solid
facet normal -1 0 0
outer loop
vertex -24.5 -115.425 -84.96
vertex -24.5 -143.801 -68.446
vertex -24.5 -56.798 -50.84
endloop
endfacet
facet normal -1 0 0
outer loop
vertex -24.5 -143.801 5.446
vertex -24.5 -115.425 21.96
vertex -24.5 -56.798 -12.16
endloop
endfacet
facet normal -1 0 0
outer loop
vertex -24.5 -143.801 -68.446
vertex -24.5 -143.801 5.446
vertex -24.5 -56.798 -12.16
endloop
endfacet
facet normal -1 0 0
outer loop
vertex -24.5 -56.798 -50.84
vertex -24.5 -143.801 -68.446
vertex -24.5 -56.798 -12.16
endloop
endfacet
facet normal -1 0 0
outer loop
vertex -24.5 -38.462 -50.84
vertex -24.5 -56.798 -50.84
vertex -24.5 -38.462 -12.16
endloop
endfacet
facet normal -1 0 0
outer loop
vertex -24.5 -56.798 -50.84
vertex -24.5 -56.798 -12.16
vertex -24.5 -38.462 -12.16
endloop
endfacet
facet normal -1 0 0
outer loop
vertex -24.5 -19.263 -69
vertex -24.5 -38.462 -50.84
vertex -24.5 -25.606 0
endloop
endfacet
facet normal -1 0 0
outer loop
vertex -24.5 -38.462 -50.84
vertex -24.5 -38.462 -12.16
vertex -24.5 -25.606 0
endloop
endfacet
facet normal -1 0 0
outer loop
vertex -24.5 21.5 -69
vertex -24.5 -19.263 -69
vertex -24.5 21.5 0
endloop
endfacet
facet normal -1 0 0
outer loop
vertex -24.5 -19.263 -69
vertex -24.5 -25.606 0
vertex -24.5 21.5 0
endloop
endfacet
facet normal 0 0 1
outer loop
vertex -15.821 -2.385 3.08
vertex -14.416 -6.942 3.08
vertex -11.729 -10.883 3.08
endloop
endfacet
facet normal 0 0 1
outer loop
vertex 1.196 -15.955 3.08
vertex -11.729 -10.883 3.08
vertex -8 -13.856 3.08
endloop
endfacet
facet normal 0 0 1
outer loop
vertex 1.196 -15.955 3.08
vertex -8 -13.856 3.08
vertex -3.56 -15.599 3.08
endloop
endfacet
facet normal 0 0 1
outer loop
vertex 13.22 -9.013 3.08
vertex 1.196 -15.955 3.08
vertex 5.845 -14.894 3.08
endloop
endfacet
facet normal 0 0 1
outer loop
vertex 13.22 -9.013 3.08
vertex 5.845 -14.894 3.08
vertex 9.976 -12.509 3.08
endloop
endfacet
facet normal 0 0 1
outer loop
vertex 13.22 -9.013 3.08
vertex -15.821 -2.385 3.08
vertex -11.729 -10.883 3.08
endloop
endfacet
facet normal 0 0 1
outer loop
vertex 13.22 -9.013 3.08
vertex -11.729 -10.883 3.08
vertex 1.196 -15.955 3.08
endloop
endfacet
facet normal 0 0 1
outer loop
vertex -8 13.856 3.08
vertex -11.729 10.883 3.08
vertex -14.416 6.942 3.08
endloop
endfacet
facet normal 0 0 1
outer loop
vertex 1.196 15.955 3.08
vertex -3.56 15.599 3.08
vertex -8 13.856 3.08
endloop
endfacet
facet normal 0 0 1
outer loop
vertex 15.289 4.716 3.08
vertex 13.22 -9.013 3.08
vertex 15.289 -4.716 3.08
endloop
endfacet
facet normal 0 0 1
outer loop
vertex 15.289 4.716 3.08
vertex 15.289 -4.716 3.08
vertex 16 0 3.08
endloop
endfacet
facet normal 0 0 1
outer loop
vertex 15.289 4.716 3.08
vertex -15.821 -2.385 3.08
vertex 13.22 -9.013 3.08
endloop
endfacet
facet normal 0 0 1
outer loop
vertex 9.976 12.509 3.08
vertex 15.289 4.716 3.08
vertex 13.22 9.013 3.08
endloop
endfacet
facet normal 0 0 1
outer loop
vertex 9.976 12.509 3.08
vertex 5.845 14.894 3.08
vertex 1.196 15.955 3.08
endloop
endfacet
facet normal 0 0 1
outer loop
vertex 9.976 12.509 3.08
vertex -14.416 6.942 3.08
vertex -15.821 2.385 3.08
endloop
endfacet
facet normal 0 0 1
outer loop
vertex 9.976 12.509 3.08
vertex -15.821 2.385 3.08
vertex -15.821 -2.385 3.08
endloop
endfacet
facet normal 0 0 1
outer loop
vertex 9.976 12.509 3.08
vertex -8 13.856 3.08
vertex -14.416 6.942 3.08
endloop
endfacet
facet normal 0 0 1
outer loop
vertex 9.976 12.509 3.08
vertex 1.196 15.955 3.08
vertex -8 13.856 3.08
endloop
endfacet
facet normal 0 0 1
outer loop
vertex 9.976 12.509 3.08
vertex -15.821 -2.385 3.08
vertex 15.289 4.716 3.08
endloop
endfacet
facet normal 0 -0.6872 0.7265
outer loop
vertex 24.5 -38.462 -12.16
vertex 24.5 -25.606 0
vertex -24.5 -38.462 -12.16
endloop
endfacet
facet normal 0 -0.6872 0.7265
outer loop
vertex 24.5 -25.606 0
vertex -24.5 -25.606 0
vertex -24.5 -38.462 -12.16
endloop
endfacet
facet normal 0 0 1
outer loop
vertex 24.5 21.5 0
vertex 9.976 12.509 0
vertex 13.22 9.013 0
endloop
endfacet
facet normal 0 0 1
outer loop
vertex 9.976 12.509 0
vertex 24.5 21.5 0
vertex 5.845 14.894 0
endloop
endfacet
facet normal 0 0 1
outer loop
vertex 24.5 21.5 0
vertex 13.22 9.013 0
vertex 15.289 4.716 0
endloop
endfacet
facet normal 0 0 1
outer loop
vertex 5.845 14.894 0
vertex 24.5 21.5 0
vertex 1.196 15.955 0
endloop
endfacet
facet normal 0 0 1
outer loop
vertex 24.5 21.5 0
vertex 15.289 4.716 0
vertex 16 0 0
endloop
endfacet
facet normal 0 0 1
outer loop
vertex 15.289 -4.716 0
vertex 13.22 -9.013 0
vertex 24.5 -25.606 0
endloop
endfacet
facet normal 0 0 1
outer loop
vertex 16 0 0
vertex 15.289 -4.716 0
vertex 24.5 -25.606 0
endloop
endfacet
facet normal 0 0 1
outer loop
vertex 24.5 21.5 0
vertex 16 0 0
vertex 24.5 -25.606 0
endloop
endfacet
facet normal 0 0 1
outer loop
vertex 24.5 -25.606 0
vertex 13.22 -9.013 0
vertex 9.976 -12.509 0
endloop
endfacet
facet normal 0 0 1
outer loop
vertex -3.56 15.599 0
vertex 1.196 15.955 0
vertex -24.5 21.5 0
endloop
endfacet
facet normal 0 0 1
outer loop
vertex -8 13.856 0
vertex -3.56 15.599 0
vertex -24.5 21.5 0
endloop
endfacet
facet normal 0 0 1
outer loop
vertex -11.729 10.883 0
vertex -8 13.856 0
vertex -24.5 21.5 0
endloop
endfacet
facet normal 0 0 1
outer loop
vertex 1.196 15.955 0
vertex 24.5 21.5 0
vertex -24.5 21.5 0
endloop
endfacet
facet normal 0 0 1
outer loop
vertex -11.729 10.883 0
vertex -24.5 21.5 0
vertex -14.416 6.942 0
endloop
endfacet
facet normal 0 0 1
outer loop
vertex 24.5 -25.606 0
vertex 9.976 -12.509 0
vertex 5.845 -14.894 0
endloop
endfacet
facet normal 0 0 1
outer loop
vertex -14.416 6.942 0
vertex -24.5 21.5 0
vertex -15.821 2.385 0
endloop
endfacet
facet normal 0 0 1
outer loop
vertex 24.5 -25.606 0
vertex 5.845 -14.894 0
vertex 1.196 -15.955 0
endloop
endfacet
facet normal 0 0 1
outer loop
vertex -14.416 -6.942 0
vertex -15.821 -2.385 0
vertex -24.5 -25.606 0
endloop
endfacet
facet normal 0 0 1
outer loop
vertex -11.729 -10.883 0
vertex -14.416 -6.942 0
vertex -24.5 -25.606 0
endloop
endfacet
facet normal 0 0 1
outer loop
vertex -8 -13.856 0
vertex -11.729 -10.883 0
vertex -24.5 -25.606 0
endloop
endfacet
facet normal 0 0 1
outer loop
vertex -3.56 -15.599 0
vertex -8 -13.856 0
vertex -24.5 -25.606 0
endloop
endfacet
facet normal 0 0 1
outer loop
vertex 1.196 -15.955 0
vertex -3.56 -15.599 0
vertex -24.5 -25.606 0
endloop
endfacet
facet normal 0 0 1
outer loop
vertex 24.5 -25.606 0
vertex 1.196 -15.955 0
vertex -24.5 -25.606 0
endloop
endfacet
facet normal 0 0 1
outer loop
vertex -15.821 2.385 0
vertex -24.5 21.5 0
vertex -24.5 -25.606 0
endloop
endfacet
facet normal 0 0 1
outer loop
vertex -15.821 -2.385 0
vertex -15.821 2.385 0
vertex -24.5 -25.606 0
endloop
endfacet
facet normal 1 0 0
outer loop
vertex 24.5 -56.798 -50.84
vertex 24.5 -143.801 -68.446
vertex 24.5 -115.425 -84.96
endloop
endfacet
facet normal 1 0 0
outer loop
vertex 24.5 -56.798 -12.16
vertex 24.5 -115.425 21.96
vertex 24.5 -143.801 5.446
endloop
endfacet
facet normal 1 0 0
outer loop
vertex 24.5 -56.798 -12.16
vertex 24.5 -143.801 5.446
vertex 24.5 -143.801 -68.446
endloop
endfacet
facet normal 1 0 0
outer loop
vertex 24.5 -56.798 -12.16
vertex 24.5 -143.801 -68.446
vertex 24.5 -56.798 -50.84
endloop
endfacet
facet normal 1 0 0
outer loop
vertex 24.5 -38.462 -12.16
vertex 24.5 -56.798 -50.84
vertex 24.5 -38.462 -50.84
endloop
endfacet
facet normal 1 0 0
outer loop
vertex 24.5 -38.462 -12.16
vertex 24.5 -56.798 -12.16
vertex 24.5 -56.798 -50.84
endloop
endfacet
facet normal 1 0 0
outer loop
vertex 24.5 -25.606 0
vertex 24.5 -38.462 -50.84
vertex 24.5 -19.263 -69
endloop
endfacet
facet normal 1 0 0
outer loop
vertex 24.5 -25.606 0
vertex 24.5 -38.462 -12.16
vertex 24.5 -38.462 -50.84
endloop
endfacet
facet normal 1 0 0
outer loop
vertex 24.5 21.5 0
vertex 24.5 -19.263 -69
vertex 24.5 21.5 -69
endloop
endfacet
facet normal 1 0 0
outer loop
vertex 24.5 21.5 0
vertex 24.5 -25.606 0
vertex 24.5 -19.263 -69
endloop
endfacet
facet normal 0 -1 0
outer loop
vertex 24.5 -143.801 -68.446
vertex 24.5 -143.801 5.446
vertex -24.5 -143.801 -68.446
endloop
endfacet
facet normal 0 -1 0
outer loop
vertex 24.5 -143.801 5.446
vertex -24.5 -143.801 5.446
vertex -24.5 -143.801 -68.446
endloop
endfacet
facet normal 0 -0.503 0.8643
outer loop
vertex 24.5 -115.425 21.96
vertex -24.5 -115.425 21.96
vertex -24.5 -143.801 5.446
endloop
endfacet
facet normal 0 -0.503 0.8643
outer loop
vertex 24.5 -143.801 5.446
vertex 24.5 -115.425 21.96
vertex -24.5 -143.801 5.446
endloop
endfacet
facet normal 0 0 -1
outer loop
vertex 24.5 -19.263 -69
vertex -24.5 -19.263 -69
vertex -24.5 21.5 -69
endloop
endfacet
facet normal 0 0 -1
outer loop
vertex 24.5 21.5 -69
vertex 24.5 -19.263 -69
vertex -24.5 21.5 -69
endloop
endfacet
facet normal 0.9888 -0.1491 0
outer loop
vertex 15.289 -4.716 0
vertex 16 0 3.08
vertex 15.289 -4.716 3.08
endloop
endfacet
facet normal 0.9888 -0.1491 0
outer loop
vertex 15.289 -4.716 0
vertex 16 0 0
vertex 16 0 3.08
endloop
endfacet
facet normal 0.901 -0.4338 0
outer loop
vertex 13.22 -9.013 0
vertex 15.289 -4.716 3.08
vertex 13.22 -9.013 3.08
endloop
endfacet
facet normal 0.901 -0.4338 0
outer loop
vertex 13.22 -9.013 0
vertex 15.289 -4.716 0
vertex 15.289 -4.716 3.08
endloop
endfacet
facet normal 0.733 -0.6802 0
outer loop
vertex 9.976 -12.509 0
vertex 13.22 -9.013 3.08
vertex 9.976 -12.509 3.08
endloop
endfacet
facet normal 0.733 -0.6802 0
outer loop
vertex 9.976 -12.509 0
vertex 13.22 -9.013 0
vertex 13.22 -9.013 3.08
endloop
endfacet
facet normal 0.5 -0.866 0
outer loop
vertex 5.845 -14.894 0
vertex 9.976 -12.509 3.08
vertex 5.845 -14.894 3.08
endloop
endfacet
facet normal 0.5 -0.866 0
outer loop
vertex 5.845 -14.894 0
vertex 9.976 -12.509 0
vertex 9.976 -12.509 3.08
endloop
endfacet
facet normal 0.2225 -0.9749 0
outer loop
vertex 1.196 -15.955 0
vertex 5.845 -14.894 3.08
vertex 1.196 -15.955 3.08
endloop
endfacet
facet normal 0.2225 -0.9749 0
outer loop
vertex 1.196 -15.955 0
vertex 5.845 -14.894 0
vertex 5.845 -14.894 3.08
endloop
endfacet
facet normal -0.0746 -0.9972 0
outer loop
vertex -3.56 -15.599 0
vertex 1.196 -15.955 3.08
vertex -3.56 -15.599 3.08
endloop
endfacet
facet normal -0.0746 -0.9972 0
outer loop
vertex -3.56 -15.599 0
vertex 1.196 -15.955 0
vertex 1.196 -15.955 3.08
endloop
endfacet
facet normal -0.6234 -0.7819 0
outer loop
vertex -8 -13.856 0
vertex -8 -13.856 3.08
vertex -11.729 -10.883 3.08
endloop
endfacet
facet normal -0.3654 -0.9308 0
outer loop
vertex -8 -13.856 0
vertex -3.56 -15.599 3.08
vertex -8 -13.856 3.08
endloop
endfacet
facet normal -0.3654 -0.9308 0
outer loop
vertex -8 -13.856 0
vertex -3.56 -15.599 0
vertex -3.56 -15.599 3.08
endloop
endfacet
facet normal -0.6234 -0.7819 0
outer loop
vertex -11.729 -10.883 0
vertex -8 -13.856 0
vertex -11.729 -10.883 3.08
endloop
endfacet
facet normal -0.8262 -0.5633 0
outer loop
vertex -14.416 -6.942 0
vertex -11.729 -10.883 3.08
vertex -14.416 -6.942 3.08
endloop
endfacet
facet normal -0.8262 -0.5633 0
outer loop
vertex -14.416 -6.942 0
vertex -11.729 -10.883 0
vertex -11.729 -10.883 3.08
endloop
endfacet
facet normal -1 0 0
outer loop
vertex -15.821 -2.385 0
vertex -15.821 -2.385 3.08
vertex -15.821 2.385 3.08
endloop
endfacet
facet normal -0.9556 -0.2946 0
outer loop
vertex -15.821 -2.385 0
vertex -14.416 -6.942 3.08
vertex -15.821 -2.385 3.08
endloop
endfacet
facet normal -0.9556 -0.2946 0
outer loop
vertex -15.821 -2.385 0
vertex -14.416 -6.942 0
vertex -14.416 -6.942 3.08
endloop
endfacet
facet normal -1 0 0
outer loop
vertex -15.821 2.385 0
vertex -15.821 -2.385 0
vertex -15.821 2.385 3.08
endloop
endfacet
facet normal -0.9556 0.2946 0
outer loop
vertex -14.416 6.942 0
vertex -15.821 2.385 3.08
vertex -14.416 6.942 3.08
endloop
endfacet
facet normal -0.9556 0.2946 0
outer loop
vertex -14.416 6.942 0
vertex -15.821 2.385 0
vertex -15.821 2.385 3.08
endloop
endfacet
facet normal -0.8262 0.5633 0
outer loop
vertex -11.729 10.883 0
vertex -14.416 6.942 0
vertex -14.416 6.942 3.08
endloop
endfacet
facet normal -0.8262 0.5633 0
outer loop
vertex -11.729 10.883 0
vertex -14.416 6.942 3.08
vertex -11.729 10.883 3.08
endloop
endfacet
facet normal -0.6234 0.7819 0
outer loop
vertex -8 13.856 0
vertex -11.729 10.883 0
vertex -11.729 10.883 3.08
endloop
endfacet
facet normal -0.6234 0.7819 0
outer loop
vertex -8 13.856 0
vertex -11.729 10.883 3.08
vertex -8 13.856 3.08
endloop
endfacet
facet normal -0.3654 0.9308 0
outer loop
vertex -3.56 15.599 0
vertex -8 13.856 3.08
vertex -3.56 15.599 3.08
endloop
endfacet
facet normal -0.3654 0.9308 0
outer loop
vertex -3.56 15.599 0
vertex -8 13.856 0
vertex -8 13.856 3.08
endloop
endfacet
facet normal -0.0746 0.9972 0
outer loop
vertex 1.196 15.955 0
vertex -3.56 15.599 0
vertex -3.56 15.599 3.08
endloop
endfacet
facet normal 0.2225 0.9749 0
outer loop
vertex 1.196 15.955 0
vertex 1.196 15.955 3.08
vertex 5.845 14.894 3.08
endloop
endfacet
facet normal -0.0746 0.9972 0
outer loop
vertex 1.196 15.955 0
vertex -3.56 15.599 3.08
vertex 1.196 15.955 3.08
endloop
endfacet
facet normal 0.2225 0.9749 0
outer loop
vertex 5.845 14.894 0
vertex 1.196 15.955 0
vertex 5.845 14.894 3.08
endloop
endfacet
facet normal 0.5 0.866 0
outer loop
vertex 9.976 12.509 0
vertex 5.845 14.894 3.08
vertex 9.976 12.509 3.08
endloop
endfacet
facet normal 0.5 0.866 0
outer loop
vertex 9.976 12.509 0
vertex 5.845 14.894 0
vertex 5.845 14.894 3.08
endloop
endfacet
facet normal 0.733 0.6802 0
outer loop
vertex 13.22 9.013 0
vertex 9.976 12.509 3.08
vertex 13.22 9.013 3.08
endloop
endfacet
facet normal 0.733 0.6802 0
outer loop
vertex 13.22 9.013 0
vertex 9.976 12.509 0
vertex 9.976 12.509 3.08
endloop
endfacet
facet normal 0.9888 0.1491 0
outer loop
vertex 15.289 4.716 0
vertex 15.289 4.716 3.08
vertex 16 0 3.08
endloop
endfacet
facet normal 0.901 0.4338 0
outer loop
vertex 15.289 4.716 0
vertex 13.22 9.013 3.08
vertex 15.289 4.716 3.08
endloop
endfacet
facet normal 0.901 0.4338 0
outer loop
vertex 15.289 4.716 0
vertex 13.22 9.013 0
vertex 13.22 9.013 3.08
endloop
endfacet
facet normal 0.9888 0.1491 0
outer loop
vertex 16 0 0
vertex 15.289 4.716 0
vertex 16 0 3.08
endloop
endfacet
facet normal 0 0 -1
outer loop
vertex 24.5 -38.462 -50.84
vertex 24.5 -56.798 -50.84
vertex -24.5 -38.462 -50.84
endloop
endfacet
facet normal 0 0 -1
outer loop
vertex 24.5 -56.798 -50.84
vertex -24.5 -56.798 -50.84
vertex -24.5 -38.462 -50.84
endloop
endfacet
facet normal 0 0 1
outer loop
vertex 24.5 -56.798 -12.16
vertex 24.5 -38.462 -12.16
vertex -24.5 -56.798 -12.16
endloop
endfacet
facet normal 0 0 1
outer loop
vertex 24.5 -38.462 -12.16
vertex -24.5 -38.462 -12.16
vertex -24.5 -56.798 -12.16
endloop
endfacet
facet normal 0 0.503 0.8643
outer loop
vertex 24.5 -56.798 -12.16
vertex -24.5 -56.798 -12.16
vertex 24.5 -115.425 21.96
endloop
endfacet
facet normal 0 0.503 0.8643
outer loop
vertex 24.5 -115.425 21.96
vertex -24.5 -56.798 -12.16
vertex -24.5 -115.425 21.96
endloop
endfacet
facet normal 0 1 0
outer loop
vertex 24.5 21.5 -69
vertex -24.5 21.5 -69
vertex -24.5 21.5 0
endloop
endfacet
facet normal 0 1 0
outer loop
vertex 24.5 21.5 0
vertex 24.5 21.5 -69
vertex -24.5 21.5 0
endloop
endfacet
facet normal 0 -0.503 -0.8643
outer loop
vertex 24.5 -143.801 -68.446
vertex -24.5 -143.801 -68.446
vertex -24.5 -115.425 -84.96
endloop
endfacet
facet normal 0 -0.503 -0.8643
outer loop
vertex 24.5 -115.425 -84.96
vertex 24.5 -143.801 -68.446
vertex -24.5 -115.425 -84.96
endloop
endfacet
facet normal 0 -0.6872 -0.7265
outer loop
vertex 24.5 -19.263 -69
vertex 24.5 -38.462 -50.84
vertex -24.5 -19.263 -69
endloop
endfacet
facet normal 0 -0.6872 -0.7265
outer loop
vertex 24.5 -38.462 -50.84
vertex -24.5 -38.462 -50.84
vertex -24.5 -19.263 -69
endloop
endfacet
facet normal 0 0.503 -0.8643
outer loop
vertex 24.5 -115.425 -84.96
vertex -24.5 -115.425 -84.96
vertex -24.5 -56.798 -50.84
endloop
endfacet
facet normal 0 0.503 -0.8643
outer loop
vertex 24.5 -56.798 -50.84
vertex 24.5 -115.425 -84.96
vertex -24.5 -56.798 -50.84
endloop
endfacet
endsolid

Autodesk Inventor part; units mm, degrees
ref_plane "XZ Plane" through (0, 0, 0) normal (0, 1, 0) x (-1, 0, 0)
sketch "Sketch1" plane through (0, 0, 0) normal (1, 0, 0) x (0, 1, 0)
  line L0 (-16, 3.08) -> (16, 3.08)
  line L1 (16, 3.08) -> (16, 0)
  line L2 (16, 0) -> (-16, 0)
  line L3 (-16, 0) -> (-16, 3.08)
  line L4 (-20.328, 3.08) -> (15.75, 3.08) construction
  line L5 (16, 0) -> (-16, 0) construction
  line L6 (-16, 0) -> (-25.6061, 0)
  line L7 (-25.6061, 0) -> (-38.4616, -12.16)
  line L8 (-38.4616, -12.16) -> (-56.7976, -12.16)
  line L9 (-56.7976, -12.16) -> (-115.4254, 21.9603)
  line L10 (-115.4254, 21.9603) -> (-143.8011, 5.4461)
  line L11 (-143.8011, 5.4461) -> (-143.8011, -68.4461)
  line L12 (-143.8011, -68.4461) -> (-115.4254, -84.9603)
  line L13 (-115.4254, -84.9603) -> (-56.7976, -50.84)
  line L14 (-56.7976, -50.84) -> (-38.4616, -50.84)
  line L15 (-38.4616, -50.84) -> (-19.263, -69)
  line L16 (-19.263, -69) -> (21.5, -69)
  line L17 (21.5, -69) -> (21.5, 0)
  line L18 (21.5, 0) -> (16, 0)
  line L19 (-19.5, -69) -> (19.5, -69) construction
  line L20 (-36.9927, -10.7705) -> (-23.8189, 1.6905) construction
  line L21 (-23.8189, -64.6905) -> (-36.9927, -52.2295) construction
  line L22 (-56.7976, -12.16) -> (-40.4836, -12.16) construction
  line L23 (-40.4836, -50.84) -> (-56.7976, -50.84) construction
  line L24 (-133.6344, 11.4742) -> (-125.5921, 15.9321) construction
  line L25 (-125.5921, -78.9321) -> (-133.6344, -74.4742) construction
  point P0 (0, 0)
  point P1 (0, 0)
  point P2 (21.5, -10)
  point P3 (-129.6132, 13.7032)
  point P4 (-129.6132, -76.7032)
  point P5 (16, 0)
  point P6 (16, 0)
extrude "Extrusion3" add sketch "Sketch1" along normal mid plane 49 contours L2 L18 L17 L16 L15 L14 L13 L12 L11 L10 L9 L8 L7 L6
sketch "Sketch3" plane through (-24.5, -25.6061, 0) normal (0, 0, 1) x (1, 0, 0)
  circle A0 centre (24.5, 25.6061) radius 16 projected
extrude "Extrusion4" add sketch "Sketch3" along normal up to surface (3.08 mm away)
properties part number "BaseBoundingBox"
